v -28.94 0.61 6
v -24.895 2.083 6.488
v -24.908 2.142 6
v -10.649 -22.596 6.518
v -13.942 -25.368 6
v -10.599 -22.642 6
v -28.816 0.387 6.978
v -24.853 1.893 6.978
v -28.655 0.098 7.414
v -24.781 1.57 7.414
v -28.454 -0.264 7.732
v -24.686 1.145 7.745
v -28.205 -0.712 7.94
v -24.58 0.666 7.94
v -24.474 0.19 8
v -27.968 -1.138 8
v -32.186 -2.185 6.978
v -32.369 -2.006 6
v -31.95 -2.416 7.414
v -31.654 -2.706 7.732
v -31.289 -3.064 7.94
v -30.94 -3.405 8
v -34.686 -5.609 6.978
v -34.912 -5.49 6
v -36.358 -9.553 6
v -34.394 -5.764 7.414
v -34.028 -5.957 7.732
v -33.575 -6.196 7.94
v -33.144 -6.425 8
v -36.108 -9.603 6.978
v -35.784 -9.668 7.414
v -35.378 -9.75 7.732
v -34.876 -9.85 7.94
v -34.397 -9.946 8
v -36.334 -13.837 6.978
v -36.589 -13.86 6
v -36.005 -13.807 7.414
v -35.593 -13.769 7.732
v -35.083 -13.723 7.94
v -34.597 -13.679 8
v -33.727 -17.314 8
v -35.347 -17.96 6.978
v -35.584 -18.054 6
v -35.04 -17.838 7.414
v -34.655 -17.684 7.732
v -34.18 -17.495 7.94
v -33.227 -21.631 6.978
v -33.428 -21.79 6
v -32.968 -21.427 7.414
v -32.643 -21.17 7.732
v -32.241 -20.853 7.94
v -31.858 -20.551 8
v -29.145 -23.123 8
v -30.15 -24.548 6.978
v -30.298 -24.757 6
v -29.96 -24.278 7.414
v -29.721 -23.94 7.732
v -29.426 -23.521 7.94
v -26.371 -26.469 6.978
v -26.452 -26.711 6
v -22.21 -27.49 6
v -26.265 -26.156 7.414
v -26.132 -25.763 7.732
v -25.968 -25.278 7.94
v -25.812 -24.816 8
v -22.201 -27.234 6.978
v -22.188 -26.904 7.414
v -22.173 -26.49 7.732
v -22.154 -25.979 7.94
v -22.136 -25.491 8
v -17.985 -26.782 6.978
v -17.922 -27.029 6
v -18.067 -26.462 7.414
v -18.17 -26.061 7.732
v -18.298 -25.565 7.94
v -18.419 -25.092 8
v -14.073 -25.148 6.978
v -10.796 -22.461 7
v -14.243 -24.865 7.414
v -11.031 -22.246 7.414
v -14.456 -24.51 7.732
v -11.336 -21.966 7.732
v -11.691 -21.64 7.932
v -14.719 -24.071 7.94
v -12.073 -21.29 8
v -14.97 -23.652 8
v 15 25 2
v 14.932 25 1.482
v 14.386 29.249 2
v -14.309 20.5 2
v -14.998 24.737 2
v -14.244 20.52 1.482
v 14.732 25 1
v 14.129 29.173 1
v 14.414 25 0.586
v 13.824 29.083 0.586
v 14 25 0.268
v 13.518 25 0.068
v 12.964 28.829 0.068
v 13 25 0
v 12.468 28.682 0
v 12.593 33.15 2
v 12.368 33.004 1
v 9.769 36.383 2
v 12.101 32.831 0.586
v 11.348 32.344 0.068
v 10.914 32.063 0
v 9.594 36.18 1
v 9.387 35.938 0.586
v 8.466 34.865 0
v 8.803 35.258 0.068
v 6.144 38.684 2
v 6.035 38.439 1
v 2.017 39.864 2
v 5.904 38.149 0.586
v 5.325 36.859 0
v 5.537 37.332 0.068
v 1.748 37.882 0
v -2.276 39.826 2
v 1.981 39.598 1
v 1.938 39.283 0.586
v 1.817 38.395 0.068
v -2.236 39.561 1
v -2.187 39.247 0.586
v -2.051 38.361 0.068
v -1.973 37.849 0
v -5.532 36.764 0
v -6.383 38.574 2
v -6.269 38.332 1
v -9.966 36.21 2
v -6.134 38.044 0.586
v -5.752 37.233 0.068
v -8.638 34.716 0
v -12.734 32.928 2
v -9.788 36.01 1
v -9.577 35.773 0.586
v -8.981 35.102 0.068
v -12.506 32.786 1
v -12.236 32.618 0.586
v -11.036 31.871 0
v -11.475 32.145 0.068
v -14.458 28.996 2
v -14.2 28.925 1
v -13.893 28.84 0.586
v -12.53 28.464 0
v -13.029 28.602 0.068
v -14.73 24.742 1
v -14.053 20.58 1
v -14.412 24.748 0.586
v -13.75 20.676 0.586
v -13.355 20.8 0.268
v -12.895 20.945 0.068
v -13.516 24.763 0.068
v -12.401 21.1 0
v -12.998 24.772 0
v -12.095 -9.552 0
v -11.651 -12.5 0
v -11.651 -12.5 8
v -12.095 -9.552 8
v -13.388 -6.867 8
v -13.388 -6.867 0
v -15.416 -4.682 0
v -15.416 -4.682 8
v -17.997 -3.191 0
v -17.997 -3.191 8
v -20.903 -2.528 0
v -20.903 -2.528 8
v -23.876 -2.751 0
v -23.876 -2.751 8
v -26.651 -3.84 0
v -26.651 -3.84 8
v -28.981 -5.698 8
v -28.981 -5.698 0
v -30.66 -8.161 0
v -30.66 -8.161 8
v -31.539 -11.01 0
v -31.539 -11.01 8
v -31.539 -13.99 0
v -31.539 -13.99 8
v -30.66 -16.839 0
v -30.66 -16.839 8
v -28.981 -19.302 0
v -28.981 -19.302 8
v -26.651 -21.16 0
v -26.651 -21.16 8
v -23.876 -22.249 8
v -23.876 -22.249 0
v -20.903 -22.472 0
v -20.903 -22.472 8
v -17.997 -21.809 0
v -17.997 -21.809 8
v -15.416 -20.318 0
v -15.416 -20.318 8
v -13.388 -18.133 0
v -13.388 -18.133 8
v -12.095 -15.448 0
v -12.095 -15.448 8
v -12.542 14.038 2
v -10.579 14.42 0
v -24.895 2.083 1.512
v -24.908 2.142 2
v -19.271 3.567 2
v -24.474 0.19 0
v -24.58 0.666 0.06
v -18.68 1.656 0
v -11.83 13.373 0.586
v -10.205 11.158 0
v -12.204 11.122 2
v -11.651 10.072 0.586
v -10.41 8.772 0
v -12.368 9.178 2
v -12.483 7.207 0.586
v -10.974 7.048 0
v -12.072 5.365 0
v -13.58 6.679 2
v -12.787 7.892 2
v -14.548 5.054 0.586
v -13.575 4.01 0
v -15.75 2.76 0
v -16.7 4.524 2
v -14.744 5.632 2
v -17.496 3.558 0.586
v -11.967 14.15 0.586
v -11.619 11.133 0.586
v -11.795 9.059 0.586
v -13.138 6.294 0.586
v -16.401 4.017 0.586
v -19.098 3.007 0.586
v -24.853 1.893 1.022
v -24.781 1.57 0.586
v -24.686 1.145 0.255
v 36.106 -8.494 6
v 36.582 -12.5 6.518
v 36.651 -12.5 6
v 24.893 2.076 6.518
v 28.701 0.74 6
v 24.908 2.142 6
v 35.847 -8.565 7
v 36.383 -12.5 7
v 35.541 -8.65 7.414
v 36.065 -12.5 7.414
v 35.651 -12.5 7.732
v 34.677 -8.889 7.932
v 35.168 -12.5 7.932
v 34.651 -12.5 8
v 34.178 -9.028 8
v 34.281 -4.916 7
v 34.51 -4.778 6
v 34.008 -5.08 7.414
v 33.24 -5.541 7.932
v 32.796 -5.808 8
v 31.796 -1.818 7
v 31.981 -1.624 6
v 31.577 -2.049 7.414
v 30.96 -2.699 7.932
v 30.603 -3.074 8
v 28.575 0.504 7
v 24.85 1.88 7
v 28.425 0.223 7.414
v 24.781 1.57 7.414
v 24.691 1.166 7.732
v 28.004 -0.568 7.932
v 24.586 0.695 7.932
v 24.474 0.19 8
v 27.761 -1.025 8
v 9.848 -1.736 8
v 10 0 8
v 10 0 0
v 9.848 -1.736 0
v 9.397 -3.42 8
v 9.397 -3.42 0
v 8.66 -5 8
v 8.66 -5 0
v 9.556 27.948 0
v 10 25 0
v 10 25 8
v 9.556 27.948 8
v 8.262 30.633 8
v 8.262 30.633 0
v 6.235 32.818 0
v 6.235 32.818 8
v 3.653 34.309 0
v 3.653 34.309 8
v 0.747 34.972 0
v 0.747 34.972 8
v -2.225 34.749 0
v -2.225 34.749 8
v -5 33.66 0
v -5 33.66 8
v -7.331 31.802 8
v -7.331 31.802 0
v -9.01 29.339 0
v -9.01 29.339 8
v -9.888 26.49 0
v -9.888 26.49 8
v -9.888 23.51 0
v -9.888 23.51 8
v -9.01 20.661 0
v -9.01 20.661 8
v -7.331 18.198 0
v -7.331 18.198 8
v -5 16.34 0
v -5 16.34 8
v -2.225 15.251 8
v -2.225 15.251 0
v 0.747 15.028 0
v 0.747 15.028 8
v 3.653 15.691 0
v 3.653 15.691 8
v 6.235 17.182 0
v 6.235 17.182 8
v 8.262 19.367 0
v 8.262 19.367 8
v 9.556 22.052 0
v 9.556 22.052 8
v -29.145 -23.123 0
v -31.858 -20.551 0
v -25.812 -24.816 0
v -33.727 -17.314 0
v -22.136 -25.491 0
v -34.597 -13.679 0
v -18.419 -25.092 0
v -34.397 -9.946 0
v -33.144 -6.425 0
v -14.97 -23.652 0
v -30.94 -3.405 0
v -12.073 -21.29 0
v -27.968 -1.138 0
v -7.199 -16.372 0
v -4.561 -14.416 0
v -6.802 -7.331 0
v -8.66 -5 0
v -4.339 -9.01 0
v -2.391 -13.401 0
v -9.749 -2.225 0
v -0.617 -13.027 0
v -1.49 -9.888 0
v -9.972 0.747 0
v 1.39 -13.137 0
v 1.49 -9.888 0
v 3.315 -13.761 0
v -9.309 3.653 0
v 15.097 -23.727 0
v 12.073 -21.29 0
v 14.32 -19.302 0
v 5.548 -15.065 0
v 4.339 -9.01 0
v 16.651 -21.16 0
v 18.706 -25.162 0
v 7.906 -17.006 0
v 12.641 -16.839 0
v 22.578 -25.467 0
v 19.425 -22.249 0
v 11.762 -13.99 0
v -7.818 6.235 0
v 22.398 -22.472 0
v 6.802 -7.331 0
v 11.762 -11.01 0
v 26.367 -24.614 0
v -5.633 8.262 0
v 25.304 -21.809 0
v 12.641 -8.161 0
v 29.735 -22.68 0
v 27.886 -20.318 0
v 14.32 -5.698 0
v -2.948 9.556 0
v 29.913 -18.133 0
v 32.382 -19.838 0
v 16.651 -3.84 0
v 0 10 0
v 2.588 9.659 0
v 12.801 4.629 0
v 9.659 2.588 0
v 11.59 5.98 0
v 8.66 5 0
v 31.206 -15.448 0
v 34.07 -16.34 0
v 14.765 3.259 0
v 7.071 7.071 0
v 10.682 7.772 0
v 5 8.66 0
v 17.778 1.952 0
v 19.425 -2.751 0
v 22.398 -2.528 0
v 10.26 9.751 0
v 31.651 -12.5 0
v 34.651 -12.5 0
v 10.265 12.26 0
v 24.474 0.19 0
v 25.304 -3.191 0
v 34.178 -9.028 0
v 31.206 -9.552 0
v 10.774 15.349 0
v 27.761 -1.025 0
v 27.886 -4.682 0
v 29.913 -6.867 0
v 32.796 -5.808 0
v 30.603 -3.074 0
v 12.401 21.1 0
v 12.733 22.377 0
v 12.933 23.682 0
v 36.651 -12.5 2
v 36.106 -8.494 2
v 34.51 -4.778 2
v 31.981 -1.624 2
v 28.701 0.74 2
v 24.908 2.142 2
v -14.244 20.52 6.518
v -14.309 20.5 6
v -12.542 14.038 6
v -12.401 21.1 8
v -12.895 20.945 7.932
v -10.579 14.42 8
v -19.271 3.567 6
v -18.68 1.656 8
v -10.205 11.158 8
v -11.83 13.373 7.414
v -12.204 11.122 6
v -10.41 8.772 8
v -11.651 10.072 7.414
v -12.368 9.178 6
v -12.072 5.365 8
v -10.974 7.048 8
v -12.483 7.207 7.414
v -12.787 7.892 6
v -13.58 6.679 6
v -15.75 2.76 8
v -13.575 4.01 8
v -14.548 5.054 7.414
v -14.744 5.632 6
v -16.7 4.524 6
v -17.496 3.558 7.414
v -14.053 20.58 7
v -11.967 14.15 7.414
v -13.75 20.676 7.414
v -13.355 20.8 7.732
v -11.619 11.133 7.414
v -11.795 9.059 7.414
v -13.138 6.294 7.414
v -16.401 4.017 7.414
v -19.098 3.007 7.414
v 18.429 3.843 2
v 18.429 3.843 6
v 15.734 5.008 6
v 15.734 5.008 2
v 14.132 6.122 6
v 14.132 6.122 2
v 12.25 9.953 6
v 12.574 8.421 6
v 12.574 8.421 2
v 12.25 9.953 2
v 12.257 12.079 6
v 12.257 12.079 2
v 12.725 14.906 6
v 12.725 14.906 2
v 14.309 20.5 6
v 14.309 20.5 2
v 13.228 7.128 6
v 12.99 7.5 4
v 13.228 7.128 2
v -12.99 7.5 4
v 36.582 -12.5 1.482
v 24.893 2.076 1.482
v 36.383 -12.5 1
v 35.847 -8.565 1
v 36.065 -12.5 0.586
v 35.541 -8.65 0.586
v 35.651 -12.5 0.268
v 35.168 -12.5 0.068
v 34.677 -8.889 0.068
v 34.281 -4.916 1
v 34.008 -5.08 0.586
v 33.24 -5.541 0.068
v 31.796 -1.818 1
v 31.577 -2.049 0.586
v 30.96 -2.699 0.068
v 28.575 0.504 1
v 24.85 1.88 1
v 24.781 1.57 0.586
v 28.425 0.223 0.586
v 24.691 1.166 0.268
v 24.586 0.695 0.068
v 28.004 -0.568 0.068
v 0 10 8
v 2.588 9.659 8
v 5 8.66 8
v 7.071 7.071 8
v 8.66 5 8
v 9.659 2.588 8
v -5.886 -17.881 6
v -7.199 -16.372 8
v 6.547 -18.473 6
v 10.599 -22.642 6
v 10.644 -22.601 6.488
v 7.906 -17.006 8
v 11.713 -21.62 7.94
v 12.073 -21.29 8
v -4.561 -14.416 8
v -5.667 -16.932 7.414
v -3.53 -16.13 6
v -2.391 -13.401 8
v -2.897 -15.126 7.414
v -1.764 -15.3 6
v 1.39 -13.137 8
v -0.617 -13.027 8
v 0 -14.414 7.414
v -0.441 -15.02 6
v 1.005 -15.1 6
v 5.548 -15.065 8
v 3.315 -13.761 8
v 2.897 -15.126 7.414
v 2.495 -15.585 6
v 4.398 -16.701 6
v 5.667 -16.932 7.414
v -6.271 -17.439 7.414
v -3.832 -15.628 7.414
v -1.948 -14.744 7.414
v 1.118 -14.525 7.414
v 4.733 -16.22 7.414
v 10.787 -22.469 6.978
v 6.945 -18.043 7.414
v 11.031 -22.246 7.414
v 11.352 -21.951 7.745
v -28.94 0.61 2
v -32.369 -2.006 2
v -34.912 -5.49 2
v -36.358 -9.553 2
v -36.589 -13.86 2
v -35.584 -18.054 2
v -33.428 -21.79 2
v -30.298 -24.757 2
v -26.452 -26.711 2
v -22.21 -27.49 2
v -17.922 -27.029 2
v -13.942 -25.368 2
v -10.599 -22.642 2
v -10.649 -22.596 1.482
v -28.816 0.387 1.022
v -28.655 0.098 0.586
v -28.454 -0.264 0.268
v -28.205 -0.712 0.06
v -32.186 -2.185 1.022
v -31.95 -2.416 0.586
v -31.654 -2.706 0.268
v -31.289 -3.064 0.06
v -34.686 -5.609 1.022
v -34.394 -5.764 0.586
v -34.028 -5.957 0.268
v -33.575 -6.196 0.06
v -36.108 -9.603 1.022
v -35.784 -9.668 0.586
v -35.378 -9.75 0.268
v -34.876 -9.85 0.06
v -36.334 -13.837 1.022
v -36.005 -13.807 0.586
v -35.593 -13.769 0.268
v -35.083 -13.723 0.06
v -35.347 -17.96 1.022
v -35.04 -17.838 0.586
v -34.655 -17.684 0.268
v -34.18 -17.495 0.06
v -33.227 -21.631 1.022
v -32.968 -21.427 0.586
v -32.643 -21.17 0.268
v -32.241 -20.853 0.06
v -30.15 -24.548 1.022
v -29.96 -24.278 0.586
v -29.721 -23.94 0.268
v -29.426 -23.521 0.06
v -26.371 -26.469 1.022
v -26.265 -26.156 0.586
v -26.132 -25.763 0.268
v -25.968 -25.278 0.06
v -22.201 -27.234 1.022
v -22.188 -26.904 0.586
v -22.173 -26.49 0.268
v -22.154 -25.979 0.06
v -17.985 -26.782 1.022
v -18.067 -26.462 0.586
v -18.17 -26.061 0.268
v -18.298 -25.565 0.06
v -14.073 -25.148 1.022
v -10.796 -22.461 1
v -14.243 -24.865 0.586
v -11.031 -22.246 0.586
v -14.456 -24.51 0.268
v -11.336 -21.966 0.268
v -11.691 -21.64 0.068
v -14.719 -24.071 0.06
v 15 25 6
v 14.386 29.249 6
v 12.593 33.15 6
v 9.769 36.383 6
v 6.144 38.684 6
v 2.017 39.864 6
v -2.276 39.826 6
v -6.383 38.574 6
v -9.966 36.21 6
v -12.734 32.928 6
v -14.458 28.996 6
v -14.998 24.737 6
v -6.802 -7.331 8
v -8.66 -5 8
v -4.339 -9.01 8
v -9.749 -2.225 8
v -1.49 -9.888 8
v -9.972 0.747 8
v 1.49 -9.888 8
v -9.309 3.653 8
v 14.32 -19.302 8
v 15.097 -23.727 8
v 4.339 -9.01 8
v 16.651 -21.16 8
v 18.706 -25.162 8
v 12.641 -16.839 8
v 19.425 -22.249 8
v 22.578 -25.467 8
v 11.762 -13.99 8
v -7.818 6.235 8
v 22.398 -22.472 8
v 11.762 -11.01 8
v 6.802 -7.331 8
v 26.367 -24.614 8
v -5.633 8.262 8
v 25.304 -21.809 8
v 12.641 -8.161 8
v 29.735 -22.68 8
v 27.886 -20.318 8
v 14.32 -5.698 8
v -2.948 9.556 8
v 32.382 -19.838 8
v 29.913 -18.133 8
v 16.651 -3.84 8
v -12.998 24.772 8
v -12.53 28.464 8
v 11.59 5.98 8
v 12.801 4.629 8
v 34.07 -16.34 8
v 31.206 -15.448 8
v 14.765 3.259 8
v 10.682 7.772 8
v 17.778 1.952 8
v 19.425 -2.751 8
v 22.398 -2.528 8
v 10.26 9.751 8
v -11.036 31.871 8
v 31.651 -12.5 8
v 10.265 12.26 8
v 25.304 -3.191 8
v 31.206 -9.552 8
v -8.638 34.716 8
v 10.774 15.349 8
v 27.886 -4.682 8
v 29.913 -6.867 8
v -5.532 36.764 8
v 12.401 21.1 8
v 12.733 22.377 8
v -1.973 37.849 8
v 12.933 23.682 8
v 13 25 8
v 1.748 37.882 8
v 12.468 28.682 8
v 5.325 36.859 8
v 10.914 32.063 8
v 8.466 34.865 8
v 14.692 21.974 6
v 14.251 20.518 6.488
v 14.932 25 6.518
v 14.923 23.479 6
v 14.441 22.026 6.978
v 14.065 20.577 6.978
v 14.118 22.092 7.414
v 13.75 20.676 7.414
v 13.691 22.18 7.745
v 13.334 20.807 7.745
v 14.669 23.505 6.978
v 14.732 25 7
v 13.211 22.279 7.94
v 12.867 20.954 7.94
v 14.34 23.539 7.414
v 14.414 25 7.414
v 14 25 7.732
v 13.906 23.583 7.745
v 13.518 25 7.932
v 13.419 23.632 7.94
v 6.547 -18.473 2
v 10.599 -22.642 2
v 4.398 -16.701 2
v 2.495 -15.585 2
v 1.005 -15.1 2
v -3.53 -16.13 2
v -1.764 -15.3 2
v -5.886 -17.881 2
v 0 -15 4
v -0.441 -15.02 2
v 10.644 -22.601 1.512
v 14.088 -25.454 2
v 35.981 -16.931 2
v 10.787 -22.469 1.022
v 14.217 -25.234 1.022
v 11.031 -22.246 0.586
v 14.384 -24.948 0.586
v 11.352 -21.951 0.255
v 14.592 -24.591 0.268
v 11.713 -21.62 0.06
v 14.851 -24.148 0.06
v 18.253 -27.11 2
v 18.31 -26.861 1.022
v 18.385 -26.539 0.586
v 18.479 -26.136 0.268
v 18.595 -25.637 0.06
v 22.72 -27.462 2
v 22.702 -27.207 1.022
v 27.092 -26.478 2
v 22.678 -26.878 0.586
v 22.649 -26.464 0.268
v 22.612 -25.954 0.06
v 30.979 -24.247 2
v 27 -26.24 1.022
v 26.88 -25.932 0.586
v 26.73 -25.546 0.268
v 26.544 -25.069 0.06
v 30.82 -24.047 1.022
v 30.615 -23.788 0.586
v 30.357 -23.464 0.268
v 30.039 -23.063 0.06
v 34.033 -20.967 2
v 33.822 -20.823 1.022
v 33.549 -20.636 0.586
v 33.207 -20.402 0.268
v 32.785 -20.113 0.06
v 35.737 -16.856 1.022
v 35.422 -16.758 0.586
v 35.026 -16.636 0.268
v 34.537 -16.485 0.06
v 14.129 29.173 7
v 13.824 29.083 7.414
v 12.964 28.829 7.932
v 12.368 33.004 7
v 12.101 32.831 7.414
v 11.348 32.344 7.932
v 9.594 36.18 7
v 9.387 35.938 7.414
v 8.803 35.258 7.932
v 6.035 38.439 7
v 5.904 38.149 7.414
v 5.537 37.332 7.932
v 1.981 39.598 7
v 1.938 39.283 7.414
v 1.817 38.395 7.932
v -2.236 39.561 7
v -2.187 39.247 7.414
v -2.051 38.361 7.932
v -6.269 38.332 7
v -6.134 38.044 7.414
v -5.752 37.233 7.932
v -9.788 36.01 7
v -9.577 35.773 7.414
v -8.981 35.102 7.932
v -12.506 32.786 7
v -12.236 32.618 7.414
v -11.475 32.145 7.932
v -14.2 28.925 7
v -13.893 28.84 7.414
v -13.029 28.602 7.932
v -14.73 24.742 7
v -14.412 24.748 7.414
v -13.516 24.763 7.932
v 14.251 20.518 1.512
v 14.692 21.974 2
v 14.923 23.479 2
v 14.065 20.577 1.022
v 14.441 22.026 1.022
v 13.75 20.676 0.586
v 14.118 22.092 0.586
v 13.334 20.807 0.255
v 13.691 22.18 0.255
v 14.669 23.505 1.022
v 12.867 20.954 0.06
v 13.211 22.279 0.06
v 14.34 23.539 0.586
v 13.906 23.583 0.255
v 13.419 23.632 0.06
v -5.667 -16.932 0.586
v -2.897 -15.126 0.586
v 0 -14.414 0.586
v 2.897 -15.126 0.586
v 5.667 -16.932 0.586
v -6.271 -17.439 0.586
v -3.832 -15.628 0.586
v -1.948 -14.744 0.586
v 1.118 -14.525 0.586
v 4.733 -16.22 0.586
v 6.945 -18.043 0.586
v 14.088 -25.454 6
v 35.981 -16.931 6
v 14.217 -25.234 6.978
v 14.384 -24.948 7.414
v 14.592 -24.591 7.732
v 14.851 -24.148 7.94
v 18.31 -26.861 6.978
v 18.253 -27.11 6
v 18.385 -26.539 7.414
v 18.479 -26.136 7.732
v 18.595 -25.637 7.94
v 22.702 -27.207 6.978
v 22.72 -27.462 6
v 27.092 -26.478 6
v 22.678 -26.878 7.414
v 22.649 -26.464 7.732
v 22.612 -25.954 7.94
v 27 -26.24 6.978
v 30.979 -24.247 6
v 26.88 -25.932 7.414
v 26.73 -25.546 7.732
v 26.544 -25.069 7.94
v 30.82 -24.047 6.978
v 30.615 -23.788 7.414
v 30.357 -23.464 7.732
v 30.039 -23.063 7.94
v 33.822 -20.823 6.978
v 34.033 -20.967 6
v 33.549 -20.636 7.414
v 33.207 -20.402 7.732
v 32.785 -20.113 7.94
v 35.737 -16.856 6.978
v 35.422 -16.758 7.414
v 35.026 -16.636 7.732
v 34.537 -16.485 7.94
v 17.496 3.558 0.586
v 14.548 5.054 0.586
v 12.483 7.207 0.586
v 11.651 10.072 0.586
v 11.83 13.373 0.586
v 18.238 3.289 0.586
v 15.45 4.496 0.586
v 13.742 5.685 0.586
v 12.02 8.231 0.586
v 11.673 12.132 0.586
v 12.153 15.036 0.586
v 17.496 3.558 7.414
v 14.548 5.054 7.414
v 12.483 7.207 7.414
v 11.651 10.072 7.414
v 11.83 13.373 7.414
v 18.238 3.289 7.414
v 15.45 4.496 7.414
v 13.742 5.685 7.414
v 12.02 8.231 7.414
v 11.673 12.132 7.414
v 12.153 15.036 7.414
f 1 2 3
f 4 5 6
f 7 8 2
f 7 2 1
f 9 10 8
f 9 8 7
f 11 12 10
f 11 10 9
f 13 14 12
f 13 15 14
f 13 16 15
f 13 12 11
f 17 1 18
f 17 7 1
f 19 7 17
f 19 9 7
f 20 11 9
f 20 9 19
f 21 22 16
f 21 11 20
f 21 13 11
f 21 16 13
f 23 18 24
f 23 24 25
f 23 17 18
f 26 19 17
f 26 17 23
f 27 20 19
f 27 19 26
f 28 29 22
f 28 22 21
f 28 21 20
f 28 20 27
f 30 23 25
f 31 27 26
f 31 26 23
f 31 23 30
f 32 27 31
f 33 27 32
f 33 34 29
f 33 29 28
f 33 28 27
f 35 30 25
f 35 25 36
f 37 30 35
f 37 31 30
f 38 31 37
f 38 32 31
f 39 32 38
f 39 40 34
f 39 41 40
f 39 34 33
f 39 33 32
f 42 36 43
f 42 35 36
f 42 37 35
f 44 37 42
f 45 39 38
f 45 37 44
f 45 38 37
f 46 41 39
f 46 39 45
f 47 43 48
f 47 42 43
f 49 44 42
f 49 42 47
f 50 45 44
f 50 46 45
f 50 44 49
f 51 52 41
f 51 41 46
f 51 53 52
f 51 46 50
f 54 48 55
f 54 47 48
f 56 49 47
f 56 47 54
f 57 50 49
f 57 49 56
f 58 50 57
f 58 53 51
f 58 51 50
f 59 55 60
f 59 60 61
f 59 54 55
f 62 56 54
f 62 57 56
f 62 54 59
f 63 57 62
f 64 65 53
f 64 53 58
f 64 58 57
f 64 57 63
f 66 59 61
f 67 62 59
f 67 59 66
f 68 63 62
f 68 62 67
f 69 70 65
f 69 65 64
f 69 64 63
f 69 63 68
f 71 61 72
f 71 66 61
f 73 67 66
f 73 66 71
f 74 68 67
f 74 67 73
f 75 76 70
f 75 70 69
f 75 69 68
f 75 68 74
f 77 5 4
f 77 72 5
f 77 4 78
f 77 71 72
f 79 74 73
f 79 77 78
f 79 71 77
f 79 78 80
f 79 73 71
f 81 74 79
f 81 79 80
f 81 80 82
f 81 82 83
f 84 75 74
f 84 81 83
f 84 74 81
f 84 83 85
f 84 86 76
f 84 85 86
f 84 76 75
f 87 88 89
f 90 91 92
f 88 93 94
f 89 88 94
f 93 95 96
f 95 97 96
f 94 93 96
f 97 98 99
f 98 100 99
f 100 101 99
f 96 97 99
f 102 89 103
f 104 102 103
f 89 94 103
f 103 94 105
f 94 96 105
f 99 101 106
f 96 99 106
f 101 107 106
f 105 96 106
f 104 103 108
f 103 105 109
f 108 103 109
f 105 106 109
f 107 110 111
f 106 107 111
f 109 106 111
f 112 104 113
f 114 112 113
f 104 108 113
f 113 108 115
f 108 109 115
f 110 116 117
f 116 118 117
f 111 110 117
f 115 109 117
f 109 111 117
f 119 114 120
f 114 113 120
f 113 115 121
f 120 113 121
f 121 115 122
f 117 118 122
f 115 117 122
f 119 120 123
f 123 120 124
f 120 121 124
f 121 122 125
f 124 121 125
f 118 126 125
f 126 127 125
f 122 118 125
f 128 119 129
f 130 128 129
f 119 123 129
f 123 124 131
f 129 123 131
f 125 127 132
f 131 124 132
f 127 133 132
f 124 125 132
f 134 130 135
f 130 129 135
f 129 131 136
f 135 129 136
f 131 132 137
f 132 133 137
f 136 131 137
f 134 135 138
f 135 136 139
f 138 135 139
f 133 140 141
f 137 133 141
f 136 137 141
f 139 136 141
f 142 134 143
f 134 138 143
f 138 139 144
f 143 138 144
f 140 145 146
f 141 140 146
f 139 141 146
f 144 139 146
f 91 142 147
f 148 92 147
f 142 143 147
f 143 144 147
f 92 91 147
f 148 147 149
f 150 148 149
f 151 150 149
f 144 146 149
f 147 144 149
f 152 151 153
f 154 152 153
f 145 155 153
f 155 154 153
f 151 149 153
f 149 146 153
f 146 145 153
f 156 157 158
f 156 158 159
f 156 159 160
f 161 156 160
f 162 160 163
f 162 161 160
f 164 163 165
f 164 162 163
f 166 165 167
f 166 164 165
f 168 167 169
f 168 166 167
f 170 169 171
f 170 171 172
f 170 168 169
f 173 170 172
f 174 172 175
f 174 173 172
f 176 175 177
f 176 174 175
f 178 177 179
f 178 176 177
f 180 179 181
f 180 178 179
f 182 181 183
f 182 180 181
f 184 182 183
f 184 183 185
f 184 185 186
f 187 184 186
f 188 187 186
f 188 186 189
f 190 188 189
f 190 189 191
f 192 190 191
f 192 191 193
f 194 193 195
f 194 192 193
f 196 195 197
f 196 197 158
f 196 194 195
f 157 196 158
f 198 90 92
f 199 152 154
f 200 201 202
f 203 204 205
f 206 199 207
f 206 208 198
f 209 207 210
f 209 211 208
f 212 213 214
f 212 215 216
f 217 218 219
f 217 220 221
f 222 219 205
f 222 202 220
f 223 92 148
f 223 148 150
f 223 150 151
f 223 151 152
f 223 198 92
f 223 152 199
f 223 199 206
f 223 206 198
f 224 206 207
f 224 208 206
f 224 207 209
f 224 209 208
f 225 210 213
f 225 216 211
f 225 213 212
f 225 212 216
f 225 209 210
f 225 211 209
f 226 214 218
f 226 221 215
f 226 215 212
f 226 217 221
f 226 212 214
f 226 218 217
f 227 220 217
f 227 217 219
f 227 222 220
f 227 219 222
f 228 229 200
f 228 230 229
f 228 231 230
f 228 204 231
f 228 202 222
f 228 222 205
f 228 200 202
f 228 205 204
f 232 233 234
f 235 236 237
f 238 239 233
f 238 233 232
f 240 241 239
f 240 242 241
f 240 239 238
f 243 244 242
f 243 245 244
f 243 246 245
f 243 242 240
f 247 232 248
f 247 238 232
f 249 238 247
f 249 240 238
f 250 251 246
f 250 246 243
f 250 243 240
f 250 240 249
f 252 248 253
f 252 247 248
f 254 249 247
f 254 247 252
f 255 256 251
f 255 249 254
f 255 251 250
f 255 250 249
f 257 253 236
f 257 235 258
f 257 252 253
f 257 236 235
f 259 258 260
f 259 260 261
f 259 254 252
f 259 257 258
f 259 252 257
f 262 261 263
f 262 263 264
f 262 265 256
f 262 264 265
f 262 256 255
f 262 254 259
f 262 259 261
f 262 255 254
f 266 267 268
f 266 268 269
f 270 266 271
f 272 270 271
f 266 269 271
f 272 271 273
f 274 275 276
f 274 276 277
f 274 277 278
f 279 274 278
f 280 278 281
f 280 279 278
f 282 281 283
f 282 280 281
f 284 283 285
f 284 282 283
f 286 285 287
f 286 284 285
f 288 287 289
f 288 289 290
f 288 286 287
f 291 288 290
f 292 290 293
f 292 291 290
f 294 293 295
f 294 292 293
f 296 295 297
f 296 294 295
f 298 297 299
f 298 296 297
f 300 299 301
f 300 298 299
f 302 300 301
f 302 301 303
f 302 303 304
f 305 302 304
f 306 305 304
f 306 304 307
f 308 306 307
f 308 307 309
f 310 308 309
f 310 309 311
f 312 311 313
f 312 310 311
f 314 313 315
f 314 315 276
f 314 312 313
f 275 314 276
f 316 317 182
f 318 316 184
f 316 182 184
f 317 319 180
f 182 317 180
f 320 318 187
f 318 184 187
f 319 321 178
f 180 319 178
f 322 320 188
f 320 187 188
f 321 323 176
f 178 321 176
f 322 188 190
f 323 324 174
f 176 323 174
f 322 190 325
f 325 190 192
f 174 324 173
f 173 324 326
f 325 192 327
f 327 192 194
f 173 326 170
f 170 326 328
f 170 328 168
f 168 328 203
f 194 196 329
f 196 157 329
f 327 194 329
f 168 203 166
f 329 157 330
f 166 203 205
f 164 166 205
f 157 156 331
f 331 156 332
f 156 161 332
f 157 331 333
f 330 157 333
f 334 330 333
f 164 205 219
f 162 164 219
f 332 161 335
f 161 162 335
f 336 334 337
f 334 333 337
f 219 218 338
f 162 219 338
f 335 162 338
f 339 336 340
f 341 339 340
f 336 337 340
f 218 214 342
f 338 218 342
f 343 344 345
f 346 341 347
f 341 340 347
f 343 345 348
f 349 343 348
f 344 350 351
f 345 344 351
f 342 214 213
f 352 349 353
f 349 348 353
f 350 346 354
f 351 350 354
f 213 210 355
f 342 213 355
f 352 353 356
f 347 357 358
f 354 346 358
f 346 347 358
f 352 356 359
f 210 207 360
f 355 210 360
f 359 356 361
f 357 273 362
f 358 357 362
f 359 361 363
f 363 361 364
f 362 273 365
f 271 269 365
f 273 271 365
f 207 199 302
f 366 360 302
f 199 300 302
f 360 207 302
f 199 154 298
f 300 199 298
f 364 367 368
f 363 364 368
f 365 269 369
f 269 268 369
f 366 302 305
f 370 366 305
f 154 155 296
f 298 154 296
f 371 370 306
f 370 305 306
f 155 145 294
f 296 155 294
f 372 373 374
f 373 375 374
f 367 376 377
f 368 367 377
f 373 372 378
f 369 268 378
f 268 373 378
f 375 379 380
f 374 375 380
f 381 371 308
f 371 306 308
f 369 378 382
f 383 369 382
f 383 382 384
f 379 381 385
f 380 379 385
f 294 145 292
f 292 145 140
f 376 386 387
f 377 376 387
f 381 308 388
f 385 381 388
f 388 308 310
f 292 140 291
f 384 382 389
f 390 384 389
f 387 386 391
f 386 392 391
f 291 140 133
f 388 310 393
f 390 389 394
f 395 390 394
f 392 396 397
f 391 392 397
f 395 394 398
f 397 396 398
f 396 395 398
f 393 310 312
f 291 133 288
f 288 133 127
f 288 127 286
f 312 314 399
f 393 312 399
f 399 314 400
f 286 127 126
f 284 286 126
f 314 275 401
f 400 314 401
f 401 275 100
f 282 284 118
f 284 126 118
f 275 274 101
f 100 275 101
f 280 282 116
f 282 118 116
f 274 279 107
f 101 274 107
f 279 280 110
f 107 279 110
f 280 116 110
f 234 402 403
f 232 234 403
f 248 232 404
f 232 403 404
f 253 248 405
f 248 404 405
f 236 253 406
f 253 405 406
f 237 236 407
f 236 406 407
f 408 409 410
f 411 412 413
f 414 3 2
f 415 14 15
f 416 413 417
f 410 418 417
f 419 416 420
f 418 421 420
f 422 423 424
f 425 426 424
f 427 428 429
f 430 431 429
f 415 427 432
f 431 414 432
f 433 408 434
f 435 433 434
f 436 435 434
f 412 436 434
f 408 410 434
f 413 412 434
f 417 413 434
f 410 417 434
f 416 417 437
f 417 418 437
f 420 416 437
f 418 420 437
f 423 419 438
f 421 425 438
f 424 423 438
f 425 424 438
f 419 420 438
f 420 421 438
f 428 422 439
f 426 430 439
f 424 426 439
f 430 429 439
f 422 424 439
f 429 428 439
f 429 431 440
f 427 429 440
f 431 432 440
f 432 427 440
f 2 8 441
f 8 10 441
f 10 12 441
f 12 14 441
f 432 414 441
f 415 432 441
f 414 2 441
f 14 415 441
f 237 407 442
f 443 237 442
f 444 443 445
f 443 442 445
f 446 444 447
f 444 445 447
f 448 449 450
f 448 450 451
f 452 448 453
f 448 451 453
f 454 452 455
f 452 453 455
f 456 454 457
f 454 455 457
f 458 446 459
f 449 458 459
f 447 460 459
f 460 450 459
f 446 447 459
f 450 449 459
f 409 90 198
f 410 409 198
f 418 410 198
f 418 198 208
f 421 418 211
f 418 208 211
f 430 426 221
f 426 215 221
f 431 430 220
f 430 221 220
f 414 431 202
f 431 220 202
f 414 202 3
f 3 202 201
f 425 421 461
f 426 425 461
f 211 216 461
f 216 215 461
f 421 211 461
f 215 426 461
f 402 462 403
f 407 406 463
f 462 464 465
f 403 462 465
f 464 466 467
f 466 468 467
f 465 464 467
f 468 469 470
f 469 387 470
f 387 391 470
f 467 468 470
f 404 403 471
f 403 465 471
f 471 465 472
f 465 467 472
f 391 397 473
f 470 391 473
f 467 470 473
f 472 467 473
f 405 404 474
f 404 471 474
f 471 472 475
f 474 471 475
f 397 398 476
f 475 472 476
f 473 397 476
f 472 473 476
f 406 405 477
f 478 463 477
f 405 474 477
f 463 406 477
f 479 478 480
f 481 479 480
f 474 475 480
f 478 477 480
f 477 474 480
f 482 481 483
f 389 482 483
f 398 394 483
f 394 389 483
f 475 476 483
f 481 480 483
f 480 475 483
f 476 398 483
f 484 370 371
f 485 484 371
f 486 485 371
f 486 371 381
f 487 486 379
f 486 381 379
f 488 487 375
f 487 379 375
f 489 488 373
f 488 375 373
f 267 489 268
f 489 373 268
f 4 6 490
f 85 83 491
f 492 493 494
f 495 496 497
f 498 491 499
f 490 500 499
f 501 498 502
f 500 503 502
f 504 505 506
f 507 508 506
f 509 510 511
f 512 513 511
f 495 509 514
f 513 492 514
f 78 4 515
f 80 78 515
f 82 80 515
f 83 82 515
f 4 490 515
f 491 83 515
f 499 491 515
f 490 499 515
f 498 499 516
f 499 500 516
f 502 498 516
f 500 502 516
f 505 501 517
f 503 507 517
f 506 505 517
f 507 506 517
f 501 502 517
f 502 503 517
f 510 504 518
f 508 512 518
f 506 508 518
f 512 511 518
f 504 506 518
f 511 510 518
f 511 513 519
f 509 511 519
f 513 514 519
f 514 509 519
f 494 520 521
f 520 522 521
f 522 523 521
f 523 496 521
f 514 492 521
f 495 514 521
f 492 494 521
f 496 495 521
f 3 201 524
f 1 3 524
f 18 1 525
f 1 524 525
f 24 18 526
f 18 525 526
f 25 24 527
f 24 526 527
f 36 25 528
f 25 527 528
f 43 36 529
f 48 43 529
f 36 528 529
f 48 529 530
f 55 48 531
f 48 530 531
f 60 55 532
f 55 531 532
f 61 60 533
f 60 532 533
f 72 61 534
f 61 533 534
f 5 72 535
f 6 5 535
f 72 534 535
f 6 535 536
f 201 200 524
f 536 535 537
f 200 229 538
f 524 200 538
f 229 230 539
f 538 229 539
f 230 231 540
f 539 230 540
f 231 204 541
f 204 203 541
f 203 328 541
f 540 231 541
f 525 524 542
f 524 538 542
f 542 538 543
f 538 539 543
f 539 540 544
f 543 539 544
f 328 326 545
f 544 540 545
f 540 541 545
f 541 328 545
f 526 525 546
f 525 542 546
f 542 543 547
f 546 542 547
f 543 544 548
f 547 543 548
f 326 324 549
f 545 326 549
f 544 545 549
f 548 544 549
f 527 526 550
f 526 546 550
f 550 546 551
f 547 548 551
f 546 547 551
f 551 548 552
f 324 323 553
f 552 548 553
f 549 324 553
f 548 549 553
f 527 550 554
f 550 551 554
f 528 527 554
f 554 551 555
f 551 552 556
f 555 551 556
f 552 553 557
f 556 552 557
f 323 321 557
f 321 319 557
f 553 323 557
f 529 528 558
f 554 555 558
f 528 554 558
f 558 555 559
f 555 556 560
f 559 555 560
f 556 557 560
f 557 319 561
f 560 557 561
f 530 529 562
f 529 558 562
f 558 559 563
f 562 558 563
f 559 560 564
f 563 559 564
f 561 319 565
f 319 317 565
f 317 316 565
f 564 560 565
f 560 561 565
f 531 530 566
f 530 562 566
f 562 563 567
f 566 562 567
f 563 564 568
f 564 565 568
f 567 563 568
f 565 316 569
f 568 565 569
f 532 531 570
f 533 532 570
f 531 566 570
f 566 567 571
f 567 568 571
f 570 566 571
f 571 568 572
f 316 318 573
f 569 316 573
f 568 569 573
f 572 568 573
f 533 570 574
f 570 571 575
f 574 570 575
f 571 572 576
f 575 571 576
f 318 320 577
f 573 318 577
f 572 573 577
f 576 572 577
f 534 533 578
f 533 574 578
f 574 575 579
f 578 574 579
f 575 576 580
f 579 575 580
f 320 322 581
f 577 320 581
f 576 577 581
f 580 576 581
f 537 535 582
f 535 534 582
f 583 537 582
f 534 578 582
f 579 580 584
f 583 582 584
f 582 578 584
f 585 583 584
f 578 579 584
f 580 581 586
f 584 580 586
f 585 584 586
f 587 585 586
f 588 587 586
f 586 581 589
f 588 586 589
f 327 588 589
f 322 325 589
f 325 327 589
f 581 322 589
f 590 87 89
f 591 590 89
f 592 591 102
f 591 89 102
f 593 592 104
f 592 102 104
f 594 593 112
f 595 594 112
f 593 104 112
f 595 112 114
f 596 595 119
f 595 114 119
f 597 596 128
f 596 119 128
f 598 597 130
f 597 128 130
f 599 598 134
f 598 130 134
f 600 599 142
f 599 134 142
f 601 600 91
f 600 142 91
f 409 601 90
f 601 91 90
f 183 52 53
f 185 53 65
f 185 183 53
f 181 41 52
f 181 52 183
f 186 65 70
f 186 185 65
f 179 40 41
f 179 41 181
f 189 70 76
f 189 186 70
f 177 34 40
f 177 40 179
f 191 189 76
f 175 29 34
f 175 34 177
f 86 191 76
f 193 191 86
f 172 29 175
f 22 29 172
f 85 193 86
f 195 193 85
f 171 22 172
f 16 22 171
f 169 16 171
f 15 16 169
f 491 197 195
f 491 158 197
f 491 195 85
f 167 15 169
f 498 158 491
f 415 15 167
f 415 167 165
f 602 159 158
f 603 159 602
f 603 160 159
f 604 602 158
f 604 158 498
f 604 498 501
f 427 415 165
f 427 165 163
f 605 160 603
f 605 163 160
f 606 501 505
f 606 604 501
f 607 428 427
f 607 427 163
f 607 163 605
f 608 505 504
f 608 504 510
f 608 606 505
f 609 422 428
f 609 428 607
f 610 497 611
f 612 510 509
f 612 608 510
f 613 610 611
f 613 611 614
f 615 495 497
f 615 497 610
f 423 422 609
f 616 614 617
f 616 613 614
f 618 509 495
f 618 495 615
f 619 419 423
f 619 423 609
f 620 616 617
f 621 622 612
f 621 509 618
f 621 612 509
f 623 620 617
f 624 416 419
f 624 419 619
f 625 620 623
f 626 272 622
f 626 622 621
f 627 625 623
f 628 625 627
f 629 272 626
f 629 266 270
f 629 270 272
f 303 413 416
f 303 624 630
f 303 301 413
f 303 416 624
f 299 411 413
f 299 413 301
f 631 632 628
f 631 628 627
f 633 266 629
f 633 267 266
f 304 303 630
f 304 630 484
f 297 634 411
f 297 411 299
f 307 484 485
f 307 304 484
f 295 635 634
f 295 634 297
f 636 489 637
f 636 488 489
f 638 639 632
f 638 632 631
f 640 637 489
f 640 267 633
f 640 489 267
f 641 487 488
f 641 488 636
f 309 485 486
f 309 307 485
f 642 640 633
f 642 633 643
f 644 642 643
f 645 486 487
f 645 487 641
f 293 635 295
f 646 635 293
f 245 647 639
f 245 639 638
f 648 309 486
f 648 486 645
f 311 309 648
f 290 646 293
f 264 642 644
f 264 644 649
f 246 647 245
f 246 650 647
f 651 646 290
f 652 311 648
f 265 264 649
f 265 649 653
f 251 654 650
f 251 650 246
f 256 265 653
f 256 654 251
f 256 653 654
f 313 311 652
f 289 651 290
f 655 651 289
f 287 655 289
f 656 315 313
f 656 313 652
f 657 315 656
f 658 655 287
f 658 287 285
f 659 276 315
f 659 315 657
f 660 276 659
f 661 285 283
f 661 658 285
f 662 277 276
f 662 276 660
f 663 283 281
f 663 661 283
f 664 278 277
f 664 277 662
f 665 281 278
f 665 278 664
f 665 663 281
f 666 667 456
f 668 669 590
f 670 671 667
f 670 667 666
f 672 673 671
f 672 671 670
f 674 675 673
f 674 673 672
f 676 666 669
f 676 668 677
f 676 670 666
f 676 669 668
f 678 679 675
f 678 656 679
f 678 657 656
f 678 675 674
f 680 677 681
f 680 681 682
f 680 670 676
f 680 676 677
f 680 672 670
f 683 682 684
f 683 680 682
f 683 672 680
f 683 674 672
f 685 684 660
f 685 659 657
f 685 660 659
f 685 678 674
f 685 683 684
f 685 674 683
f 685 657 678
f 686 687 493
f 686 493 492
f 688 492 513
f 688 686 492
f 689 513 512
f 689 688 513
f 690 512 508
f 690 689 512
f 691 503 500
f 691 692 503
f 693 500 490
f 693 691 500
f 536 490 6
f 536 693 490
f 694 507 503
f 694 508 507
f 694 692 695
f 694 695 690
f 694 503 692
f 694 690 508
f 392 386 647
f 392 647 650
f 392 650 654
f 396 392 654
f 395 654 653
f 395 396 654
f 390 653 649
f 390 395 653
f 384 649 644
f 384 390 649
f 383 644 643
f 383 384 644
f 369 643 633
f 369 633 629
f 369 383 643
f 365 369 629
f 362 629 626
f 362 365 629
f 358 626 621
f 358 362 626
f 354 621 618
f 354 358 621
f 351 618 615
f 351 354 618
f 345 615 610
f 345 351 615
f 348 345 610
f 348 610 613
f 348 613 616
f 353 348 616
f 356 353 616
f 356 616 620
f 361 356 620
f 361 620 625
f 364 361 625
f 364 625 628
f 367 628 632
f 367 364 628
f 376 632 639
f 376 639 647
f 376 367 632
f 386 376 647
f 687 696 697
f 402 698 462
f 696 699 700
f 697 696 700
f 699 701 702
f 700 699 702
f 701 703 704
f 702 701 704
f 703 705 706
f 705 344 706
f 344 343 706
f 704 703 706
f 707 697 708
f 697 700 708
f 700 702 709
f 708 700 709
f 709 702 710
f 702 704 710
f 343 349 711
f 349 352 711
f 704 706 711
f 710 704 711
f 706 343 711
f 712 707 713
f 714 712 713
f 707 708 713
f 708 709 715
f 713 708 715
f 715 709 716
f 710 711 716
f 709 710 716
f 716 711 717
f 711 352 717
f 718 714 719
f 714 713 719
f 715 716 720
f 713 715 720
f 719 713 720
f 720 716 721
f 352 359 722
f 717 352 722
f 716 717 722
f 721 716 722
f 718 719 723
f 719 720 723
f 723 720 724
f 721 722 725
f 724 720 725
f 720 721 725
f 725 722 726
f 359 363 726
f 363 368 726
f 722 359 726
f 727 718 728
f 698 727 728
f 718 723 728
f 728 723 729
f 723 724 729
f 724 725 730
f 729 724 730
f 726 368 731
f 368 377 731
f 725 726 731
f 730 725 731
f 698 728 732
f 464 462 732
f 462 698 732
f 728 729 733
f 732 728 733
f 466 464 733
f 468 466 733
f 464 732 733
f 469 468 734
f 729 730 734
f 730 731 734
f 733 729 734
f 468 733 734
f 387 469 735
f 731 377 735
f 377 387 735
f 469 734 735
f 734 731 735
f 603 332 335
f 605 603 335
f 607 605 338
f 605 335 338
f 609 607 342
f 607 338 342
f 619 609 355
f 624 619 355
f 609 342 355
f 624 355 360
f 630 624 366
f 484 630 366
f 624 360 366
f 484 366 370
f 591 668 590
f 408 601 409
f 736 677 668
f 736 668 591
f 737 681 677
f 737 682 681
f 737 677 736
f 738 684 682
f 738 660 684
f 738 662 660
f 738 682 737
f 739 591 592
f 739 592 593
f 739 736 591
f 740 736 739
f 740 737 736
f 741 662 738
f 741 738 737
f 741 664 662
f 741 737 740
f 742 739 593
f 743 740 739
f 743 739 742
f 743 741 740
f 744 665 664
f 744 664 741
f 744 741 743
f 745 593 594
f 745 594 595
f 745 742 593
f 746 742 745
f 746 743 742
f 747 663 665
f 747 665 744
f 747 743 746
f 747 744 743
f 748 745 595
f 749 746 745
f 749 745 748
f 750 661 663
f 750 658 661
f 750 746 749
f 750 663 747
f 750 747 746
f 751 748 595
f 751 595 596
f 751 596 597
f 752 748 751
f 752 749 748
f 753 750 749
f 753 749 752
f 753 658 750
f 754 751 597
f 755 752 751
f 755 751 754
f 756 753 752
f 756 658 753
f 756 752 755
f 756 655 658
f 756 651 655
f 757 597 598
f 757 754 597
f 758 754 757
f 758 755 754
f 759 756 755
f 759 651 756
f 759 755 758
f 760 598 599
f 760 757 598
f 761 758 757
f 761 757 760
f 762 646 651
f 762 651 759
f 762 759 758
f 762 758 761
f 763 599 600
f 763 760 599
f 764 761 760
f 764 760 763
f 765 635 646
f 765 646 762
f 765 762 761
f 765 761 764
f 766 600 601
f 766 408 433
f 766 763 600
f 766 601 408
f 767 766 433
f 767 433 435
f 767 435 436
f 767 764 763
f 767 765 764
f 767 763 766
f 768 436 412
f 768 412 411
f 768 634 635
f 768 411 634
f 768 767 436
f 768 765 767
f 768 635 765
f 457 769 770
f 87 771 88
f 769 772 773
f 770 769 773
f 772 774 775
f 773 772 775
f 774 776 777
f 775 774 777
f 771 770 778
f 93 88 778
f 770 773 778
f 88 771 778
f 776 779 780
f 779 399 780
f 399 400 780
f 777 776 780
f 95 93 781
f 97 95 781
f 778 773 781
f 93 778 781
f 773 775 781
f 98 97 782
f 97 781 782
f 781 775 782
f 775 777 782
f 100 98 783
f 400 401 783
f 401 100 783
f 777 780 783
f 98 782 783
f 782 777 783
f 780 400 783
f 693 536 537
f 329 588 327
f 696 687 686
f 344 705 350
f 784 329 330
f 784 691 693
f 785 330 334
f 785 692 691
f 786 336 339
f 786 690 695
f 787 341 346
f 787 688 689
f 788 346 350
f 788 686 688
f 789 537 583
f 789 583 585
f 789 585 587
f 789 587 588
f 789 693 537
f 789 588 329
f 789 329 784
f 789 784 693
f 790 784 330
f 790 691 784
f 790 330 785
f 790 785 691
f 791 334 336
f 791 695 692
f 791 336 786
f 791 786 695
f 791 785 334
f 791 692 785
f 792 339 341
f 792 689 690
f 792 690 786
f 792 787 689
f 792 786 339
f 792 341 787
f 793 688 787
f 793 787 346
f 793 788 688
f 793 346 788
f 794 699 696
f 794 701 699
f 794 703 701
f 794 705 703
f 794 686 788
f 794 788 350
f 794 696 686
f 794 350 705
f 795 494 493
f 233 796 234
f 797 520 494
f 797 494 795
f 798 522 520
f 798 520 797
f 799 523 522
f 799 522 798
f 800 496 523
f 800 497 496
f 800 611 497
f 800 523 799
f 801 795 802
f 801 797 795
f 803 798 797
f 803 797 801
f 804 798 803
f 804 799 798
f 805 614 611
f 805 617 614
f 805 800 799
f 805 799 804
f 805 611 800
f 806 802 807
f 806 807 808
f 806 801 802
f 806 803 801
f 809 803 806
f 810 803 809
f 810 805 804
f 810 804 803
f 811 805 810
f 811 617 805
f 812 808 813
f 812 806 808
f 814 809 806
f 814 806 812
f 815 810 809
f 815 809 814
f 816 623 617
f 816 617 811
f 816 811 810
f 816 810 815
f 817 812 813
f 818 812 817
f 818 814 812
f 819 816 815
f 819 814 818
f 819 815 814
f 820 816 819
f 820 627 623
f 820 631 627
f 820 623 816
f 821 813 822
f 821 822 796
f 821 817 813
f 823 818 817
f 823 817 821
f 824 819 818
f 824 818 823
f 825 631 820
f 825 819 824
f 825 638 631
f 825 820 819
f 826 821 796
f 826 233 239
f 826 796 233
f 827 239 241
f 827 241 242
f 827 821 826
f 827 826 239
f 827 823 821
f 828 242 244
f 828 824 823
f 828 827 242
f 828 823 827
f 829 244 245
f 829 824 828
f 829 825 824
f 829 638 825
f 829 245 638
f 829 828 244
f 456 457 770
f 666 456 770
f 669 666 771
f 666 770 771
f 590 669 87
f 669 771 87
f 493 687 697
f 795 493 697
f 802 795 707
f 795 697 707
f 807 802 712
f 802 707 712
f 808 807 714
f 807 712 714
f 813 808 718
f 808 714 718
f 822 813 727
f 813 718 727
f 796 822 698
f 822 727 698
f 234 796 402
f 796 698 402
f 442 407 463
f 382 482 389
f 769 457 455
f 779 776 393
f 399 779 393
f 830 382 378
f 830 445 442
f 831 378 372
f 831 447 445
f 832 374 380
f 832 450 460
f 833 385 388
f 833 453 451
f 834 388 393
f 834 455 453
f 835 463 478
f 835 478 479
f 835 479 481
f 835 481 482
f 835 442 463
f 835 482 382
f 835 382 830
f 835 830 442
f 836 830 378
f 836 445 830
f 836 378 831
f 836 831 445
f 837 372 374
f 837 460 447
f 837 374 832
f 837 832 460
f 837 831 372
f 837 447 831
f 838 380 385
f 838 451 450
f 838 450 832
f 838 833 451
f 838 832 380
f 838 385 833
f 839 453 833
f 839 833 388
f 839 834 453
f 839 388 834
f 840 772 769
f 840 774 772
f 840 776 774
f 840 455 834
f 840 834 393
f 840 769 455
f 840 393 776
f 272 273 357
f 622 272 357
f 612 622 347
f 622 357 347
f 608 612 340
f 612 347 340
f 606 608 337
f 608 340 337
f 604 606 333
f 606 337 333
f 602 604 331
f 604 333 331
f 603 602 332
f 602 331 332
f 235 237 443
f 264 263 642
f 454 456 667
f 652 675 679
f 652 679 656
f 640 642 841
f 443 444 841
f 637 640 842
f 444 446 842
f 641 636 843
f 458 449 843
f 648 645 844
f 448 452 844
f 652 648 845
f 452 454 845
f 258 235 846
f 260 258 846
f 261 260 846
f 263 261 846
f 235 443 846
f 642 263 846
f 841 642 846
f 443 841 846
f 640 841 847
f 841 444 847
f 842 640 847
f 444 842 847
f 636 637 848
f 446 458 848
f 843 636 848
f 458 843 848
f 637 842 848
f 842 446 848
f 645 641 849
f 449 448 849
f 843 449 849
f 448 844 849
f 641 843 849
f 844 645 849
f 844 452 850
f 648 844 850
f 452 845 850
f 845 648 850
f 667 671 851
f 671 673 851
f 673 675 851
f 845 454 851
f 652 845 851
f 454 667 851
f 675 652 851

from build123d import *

# Parameters (mm, degrees)
F0_R     = 10
F1_DEPTH = 8
F2_R     = 2
F3_R     = 2


with BuildPart() as f1:
    # F0 (on Top) → F1 (new body)
    with BuildSketch(Plane.XY):
        with BuildLine():
            ThreePointArc((0, 10), (7.071068, 7.071068), (10, 0))
            ThreePointArc((10, 0), (9.659258, -2.58819), (8.660254, -5))
            ThreePointArc((8.660254, -5), (15.614515, 1.231906), (24.908065, 2.142034))
            add(Edge.make_bspline(
                [(24.908065, 2.142034), (19.832471, 3.291186), (9.681283, 5.589492), (12.766486, 15.529831), (14.309088, 20.5)],
                knots=[0, 0, 0, 0, 13.066713, 26.133426, 26.133426, 26.133426, 26.133426], degree=3))
            ThreePointArc((14.309088, 20.5), (8.87412, 12.906613), (0, 10))
        make_face()
        with BuildLine():
            ThreePointArc((-8.660254, -5), (-8.660254, 5), (0, 10))
            ThreePointArc((0, 10), (-8.87412, 12.906613), (-14.309088, 20.5))
            add(Edge.make_bspline(
                [(-14.309088, 20.5), (-12.766486, 15.529831), (-9.681283, 5.589492), (-19.832471, 3.291186), (-24.908065, 2.142034)],
                knots=[0, 0, 0, 0, 13.066713, 26.133426, 26.133426, 26.133426, 26.133426], degree=3))
            ThreePointArc((-24.908065, 2.142034), (-15.614515, 1.231906), (-8.660254, -5))
        make_face()
        with BuildLine():
            ThreePointArc((-14.309088, 20.5), (-8.87412, 12.906613), (0, 10))
            ThreePointArc((0, 10), (8.87412, 12.906613), (14.309088, 20.5))
            ThreePointArc((14.309088, 20.5), (14.826266, 22.723635), (15, 25))
            ThreePointArc((15, 25), (-2.276365, 39.826266), (-14.309088, 20.5))
        make_face()
        with Locations((0, 25)):
            Circle(F0_R, mode=Mode.SUBTRACT)
        with BuildLine():
            ThreePointArc((10.598977, -22.642034), (6.740395, -14.13852), (8.660254, -5))
            ThreePointArc((8.660254, -5), (0, -10), (-8.660254, -5))
            ThreePointArc((-8.660254, -5), (-7.161748, -8.617714), (-6.650635, -12.5))
            ThreePointArc((-6.650635, -12.5), (-7.672529, -17.941743), (-10.598977, -22.642034))
            add(Edge.make_bspline(
                [(10.598977, -22.642034), (7.065985, -18.821017), (0, -11.178983), (-7.065985, -18.821017), (-10.598977, -22.642034)],
                knots=[0, 0, 0, 0, 13.066713, 26.133426, 26.133426, 26.133426, 26.133426], degree=3))
        make_face()
        with BuildLine():
            ThreePointArc((24.908065, 2.142034), (15.614515, 1.231906), (8.660254, -5))
            ThreePointArc((8.660254, -5), (6.740395, -14.13852), (10.598977, -22.642034))
            ThreePointArc((10.598977, -22.642034), (27.092378, -26.478106), (36.650635, -12.5))
            ThreePointArc((36.650635, -12.5), (33.352375, -3.115477), (24.908065, 2.142034))
        make_face()
        with Locations((21.650635, -12.5)):
            Circle(F0_R, mode=Mode.SUBTRACT)
        with BuildLine():
            ThreePointArc((-6.650635, -12.5), (-7.161748, -8.617714), (-8.660254, -5))
            ThreePointArc((-8.660254, -5), (-15.614515, 1.231906), (-24.908065, 2.142034))
            ThreePointArc((-24.908065, 2.142034), (-34.641016, -20), (-10.598977, -22.642034))
            ThreePointArc((-10.598977, -22.642034), (-7.672529, -17.941743), (-6.650635, -12.5))
        make_face()
        with Locations((-21.650635, -12.5)):
            Circle(F0_R, mode=Mode.SUBTRACT)
    extrude(amount=F1_DEPTH)

    # F2
    f2_edges = [f1.edges().sort_by_distance(p)[0] for p in [
        (0, 40, 8),
        (-34.641016, -20, 8),
        (34.641016, -20, 8),
    ]]
    fillet(f2_edges, radius=F2_R)

    # F3
    f3_edges = [f1.edges().sort_by_distance(p)[0] for p in [
        (0, 40, 0),
        (-34.641016, -20, 0),
        (34.641016, -20, 0),
    ]]
    fillet(f3_edges, radius=F3_R)


solid = f1.part
